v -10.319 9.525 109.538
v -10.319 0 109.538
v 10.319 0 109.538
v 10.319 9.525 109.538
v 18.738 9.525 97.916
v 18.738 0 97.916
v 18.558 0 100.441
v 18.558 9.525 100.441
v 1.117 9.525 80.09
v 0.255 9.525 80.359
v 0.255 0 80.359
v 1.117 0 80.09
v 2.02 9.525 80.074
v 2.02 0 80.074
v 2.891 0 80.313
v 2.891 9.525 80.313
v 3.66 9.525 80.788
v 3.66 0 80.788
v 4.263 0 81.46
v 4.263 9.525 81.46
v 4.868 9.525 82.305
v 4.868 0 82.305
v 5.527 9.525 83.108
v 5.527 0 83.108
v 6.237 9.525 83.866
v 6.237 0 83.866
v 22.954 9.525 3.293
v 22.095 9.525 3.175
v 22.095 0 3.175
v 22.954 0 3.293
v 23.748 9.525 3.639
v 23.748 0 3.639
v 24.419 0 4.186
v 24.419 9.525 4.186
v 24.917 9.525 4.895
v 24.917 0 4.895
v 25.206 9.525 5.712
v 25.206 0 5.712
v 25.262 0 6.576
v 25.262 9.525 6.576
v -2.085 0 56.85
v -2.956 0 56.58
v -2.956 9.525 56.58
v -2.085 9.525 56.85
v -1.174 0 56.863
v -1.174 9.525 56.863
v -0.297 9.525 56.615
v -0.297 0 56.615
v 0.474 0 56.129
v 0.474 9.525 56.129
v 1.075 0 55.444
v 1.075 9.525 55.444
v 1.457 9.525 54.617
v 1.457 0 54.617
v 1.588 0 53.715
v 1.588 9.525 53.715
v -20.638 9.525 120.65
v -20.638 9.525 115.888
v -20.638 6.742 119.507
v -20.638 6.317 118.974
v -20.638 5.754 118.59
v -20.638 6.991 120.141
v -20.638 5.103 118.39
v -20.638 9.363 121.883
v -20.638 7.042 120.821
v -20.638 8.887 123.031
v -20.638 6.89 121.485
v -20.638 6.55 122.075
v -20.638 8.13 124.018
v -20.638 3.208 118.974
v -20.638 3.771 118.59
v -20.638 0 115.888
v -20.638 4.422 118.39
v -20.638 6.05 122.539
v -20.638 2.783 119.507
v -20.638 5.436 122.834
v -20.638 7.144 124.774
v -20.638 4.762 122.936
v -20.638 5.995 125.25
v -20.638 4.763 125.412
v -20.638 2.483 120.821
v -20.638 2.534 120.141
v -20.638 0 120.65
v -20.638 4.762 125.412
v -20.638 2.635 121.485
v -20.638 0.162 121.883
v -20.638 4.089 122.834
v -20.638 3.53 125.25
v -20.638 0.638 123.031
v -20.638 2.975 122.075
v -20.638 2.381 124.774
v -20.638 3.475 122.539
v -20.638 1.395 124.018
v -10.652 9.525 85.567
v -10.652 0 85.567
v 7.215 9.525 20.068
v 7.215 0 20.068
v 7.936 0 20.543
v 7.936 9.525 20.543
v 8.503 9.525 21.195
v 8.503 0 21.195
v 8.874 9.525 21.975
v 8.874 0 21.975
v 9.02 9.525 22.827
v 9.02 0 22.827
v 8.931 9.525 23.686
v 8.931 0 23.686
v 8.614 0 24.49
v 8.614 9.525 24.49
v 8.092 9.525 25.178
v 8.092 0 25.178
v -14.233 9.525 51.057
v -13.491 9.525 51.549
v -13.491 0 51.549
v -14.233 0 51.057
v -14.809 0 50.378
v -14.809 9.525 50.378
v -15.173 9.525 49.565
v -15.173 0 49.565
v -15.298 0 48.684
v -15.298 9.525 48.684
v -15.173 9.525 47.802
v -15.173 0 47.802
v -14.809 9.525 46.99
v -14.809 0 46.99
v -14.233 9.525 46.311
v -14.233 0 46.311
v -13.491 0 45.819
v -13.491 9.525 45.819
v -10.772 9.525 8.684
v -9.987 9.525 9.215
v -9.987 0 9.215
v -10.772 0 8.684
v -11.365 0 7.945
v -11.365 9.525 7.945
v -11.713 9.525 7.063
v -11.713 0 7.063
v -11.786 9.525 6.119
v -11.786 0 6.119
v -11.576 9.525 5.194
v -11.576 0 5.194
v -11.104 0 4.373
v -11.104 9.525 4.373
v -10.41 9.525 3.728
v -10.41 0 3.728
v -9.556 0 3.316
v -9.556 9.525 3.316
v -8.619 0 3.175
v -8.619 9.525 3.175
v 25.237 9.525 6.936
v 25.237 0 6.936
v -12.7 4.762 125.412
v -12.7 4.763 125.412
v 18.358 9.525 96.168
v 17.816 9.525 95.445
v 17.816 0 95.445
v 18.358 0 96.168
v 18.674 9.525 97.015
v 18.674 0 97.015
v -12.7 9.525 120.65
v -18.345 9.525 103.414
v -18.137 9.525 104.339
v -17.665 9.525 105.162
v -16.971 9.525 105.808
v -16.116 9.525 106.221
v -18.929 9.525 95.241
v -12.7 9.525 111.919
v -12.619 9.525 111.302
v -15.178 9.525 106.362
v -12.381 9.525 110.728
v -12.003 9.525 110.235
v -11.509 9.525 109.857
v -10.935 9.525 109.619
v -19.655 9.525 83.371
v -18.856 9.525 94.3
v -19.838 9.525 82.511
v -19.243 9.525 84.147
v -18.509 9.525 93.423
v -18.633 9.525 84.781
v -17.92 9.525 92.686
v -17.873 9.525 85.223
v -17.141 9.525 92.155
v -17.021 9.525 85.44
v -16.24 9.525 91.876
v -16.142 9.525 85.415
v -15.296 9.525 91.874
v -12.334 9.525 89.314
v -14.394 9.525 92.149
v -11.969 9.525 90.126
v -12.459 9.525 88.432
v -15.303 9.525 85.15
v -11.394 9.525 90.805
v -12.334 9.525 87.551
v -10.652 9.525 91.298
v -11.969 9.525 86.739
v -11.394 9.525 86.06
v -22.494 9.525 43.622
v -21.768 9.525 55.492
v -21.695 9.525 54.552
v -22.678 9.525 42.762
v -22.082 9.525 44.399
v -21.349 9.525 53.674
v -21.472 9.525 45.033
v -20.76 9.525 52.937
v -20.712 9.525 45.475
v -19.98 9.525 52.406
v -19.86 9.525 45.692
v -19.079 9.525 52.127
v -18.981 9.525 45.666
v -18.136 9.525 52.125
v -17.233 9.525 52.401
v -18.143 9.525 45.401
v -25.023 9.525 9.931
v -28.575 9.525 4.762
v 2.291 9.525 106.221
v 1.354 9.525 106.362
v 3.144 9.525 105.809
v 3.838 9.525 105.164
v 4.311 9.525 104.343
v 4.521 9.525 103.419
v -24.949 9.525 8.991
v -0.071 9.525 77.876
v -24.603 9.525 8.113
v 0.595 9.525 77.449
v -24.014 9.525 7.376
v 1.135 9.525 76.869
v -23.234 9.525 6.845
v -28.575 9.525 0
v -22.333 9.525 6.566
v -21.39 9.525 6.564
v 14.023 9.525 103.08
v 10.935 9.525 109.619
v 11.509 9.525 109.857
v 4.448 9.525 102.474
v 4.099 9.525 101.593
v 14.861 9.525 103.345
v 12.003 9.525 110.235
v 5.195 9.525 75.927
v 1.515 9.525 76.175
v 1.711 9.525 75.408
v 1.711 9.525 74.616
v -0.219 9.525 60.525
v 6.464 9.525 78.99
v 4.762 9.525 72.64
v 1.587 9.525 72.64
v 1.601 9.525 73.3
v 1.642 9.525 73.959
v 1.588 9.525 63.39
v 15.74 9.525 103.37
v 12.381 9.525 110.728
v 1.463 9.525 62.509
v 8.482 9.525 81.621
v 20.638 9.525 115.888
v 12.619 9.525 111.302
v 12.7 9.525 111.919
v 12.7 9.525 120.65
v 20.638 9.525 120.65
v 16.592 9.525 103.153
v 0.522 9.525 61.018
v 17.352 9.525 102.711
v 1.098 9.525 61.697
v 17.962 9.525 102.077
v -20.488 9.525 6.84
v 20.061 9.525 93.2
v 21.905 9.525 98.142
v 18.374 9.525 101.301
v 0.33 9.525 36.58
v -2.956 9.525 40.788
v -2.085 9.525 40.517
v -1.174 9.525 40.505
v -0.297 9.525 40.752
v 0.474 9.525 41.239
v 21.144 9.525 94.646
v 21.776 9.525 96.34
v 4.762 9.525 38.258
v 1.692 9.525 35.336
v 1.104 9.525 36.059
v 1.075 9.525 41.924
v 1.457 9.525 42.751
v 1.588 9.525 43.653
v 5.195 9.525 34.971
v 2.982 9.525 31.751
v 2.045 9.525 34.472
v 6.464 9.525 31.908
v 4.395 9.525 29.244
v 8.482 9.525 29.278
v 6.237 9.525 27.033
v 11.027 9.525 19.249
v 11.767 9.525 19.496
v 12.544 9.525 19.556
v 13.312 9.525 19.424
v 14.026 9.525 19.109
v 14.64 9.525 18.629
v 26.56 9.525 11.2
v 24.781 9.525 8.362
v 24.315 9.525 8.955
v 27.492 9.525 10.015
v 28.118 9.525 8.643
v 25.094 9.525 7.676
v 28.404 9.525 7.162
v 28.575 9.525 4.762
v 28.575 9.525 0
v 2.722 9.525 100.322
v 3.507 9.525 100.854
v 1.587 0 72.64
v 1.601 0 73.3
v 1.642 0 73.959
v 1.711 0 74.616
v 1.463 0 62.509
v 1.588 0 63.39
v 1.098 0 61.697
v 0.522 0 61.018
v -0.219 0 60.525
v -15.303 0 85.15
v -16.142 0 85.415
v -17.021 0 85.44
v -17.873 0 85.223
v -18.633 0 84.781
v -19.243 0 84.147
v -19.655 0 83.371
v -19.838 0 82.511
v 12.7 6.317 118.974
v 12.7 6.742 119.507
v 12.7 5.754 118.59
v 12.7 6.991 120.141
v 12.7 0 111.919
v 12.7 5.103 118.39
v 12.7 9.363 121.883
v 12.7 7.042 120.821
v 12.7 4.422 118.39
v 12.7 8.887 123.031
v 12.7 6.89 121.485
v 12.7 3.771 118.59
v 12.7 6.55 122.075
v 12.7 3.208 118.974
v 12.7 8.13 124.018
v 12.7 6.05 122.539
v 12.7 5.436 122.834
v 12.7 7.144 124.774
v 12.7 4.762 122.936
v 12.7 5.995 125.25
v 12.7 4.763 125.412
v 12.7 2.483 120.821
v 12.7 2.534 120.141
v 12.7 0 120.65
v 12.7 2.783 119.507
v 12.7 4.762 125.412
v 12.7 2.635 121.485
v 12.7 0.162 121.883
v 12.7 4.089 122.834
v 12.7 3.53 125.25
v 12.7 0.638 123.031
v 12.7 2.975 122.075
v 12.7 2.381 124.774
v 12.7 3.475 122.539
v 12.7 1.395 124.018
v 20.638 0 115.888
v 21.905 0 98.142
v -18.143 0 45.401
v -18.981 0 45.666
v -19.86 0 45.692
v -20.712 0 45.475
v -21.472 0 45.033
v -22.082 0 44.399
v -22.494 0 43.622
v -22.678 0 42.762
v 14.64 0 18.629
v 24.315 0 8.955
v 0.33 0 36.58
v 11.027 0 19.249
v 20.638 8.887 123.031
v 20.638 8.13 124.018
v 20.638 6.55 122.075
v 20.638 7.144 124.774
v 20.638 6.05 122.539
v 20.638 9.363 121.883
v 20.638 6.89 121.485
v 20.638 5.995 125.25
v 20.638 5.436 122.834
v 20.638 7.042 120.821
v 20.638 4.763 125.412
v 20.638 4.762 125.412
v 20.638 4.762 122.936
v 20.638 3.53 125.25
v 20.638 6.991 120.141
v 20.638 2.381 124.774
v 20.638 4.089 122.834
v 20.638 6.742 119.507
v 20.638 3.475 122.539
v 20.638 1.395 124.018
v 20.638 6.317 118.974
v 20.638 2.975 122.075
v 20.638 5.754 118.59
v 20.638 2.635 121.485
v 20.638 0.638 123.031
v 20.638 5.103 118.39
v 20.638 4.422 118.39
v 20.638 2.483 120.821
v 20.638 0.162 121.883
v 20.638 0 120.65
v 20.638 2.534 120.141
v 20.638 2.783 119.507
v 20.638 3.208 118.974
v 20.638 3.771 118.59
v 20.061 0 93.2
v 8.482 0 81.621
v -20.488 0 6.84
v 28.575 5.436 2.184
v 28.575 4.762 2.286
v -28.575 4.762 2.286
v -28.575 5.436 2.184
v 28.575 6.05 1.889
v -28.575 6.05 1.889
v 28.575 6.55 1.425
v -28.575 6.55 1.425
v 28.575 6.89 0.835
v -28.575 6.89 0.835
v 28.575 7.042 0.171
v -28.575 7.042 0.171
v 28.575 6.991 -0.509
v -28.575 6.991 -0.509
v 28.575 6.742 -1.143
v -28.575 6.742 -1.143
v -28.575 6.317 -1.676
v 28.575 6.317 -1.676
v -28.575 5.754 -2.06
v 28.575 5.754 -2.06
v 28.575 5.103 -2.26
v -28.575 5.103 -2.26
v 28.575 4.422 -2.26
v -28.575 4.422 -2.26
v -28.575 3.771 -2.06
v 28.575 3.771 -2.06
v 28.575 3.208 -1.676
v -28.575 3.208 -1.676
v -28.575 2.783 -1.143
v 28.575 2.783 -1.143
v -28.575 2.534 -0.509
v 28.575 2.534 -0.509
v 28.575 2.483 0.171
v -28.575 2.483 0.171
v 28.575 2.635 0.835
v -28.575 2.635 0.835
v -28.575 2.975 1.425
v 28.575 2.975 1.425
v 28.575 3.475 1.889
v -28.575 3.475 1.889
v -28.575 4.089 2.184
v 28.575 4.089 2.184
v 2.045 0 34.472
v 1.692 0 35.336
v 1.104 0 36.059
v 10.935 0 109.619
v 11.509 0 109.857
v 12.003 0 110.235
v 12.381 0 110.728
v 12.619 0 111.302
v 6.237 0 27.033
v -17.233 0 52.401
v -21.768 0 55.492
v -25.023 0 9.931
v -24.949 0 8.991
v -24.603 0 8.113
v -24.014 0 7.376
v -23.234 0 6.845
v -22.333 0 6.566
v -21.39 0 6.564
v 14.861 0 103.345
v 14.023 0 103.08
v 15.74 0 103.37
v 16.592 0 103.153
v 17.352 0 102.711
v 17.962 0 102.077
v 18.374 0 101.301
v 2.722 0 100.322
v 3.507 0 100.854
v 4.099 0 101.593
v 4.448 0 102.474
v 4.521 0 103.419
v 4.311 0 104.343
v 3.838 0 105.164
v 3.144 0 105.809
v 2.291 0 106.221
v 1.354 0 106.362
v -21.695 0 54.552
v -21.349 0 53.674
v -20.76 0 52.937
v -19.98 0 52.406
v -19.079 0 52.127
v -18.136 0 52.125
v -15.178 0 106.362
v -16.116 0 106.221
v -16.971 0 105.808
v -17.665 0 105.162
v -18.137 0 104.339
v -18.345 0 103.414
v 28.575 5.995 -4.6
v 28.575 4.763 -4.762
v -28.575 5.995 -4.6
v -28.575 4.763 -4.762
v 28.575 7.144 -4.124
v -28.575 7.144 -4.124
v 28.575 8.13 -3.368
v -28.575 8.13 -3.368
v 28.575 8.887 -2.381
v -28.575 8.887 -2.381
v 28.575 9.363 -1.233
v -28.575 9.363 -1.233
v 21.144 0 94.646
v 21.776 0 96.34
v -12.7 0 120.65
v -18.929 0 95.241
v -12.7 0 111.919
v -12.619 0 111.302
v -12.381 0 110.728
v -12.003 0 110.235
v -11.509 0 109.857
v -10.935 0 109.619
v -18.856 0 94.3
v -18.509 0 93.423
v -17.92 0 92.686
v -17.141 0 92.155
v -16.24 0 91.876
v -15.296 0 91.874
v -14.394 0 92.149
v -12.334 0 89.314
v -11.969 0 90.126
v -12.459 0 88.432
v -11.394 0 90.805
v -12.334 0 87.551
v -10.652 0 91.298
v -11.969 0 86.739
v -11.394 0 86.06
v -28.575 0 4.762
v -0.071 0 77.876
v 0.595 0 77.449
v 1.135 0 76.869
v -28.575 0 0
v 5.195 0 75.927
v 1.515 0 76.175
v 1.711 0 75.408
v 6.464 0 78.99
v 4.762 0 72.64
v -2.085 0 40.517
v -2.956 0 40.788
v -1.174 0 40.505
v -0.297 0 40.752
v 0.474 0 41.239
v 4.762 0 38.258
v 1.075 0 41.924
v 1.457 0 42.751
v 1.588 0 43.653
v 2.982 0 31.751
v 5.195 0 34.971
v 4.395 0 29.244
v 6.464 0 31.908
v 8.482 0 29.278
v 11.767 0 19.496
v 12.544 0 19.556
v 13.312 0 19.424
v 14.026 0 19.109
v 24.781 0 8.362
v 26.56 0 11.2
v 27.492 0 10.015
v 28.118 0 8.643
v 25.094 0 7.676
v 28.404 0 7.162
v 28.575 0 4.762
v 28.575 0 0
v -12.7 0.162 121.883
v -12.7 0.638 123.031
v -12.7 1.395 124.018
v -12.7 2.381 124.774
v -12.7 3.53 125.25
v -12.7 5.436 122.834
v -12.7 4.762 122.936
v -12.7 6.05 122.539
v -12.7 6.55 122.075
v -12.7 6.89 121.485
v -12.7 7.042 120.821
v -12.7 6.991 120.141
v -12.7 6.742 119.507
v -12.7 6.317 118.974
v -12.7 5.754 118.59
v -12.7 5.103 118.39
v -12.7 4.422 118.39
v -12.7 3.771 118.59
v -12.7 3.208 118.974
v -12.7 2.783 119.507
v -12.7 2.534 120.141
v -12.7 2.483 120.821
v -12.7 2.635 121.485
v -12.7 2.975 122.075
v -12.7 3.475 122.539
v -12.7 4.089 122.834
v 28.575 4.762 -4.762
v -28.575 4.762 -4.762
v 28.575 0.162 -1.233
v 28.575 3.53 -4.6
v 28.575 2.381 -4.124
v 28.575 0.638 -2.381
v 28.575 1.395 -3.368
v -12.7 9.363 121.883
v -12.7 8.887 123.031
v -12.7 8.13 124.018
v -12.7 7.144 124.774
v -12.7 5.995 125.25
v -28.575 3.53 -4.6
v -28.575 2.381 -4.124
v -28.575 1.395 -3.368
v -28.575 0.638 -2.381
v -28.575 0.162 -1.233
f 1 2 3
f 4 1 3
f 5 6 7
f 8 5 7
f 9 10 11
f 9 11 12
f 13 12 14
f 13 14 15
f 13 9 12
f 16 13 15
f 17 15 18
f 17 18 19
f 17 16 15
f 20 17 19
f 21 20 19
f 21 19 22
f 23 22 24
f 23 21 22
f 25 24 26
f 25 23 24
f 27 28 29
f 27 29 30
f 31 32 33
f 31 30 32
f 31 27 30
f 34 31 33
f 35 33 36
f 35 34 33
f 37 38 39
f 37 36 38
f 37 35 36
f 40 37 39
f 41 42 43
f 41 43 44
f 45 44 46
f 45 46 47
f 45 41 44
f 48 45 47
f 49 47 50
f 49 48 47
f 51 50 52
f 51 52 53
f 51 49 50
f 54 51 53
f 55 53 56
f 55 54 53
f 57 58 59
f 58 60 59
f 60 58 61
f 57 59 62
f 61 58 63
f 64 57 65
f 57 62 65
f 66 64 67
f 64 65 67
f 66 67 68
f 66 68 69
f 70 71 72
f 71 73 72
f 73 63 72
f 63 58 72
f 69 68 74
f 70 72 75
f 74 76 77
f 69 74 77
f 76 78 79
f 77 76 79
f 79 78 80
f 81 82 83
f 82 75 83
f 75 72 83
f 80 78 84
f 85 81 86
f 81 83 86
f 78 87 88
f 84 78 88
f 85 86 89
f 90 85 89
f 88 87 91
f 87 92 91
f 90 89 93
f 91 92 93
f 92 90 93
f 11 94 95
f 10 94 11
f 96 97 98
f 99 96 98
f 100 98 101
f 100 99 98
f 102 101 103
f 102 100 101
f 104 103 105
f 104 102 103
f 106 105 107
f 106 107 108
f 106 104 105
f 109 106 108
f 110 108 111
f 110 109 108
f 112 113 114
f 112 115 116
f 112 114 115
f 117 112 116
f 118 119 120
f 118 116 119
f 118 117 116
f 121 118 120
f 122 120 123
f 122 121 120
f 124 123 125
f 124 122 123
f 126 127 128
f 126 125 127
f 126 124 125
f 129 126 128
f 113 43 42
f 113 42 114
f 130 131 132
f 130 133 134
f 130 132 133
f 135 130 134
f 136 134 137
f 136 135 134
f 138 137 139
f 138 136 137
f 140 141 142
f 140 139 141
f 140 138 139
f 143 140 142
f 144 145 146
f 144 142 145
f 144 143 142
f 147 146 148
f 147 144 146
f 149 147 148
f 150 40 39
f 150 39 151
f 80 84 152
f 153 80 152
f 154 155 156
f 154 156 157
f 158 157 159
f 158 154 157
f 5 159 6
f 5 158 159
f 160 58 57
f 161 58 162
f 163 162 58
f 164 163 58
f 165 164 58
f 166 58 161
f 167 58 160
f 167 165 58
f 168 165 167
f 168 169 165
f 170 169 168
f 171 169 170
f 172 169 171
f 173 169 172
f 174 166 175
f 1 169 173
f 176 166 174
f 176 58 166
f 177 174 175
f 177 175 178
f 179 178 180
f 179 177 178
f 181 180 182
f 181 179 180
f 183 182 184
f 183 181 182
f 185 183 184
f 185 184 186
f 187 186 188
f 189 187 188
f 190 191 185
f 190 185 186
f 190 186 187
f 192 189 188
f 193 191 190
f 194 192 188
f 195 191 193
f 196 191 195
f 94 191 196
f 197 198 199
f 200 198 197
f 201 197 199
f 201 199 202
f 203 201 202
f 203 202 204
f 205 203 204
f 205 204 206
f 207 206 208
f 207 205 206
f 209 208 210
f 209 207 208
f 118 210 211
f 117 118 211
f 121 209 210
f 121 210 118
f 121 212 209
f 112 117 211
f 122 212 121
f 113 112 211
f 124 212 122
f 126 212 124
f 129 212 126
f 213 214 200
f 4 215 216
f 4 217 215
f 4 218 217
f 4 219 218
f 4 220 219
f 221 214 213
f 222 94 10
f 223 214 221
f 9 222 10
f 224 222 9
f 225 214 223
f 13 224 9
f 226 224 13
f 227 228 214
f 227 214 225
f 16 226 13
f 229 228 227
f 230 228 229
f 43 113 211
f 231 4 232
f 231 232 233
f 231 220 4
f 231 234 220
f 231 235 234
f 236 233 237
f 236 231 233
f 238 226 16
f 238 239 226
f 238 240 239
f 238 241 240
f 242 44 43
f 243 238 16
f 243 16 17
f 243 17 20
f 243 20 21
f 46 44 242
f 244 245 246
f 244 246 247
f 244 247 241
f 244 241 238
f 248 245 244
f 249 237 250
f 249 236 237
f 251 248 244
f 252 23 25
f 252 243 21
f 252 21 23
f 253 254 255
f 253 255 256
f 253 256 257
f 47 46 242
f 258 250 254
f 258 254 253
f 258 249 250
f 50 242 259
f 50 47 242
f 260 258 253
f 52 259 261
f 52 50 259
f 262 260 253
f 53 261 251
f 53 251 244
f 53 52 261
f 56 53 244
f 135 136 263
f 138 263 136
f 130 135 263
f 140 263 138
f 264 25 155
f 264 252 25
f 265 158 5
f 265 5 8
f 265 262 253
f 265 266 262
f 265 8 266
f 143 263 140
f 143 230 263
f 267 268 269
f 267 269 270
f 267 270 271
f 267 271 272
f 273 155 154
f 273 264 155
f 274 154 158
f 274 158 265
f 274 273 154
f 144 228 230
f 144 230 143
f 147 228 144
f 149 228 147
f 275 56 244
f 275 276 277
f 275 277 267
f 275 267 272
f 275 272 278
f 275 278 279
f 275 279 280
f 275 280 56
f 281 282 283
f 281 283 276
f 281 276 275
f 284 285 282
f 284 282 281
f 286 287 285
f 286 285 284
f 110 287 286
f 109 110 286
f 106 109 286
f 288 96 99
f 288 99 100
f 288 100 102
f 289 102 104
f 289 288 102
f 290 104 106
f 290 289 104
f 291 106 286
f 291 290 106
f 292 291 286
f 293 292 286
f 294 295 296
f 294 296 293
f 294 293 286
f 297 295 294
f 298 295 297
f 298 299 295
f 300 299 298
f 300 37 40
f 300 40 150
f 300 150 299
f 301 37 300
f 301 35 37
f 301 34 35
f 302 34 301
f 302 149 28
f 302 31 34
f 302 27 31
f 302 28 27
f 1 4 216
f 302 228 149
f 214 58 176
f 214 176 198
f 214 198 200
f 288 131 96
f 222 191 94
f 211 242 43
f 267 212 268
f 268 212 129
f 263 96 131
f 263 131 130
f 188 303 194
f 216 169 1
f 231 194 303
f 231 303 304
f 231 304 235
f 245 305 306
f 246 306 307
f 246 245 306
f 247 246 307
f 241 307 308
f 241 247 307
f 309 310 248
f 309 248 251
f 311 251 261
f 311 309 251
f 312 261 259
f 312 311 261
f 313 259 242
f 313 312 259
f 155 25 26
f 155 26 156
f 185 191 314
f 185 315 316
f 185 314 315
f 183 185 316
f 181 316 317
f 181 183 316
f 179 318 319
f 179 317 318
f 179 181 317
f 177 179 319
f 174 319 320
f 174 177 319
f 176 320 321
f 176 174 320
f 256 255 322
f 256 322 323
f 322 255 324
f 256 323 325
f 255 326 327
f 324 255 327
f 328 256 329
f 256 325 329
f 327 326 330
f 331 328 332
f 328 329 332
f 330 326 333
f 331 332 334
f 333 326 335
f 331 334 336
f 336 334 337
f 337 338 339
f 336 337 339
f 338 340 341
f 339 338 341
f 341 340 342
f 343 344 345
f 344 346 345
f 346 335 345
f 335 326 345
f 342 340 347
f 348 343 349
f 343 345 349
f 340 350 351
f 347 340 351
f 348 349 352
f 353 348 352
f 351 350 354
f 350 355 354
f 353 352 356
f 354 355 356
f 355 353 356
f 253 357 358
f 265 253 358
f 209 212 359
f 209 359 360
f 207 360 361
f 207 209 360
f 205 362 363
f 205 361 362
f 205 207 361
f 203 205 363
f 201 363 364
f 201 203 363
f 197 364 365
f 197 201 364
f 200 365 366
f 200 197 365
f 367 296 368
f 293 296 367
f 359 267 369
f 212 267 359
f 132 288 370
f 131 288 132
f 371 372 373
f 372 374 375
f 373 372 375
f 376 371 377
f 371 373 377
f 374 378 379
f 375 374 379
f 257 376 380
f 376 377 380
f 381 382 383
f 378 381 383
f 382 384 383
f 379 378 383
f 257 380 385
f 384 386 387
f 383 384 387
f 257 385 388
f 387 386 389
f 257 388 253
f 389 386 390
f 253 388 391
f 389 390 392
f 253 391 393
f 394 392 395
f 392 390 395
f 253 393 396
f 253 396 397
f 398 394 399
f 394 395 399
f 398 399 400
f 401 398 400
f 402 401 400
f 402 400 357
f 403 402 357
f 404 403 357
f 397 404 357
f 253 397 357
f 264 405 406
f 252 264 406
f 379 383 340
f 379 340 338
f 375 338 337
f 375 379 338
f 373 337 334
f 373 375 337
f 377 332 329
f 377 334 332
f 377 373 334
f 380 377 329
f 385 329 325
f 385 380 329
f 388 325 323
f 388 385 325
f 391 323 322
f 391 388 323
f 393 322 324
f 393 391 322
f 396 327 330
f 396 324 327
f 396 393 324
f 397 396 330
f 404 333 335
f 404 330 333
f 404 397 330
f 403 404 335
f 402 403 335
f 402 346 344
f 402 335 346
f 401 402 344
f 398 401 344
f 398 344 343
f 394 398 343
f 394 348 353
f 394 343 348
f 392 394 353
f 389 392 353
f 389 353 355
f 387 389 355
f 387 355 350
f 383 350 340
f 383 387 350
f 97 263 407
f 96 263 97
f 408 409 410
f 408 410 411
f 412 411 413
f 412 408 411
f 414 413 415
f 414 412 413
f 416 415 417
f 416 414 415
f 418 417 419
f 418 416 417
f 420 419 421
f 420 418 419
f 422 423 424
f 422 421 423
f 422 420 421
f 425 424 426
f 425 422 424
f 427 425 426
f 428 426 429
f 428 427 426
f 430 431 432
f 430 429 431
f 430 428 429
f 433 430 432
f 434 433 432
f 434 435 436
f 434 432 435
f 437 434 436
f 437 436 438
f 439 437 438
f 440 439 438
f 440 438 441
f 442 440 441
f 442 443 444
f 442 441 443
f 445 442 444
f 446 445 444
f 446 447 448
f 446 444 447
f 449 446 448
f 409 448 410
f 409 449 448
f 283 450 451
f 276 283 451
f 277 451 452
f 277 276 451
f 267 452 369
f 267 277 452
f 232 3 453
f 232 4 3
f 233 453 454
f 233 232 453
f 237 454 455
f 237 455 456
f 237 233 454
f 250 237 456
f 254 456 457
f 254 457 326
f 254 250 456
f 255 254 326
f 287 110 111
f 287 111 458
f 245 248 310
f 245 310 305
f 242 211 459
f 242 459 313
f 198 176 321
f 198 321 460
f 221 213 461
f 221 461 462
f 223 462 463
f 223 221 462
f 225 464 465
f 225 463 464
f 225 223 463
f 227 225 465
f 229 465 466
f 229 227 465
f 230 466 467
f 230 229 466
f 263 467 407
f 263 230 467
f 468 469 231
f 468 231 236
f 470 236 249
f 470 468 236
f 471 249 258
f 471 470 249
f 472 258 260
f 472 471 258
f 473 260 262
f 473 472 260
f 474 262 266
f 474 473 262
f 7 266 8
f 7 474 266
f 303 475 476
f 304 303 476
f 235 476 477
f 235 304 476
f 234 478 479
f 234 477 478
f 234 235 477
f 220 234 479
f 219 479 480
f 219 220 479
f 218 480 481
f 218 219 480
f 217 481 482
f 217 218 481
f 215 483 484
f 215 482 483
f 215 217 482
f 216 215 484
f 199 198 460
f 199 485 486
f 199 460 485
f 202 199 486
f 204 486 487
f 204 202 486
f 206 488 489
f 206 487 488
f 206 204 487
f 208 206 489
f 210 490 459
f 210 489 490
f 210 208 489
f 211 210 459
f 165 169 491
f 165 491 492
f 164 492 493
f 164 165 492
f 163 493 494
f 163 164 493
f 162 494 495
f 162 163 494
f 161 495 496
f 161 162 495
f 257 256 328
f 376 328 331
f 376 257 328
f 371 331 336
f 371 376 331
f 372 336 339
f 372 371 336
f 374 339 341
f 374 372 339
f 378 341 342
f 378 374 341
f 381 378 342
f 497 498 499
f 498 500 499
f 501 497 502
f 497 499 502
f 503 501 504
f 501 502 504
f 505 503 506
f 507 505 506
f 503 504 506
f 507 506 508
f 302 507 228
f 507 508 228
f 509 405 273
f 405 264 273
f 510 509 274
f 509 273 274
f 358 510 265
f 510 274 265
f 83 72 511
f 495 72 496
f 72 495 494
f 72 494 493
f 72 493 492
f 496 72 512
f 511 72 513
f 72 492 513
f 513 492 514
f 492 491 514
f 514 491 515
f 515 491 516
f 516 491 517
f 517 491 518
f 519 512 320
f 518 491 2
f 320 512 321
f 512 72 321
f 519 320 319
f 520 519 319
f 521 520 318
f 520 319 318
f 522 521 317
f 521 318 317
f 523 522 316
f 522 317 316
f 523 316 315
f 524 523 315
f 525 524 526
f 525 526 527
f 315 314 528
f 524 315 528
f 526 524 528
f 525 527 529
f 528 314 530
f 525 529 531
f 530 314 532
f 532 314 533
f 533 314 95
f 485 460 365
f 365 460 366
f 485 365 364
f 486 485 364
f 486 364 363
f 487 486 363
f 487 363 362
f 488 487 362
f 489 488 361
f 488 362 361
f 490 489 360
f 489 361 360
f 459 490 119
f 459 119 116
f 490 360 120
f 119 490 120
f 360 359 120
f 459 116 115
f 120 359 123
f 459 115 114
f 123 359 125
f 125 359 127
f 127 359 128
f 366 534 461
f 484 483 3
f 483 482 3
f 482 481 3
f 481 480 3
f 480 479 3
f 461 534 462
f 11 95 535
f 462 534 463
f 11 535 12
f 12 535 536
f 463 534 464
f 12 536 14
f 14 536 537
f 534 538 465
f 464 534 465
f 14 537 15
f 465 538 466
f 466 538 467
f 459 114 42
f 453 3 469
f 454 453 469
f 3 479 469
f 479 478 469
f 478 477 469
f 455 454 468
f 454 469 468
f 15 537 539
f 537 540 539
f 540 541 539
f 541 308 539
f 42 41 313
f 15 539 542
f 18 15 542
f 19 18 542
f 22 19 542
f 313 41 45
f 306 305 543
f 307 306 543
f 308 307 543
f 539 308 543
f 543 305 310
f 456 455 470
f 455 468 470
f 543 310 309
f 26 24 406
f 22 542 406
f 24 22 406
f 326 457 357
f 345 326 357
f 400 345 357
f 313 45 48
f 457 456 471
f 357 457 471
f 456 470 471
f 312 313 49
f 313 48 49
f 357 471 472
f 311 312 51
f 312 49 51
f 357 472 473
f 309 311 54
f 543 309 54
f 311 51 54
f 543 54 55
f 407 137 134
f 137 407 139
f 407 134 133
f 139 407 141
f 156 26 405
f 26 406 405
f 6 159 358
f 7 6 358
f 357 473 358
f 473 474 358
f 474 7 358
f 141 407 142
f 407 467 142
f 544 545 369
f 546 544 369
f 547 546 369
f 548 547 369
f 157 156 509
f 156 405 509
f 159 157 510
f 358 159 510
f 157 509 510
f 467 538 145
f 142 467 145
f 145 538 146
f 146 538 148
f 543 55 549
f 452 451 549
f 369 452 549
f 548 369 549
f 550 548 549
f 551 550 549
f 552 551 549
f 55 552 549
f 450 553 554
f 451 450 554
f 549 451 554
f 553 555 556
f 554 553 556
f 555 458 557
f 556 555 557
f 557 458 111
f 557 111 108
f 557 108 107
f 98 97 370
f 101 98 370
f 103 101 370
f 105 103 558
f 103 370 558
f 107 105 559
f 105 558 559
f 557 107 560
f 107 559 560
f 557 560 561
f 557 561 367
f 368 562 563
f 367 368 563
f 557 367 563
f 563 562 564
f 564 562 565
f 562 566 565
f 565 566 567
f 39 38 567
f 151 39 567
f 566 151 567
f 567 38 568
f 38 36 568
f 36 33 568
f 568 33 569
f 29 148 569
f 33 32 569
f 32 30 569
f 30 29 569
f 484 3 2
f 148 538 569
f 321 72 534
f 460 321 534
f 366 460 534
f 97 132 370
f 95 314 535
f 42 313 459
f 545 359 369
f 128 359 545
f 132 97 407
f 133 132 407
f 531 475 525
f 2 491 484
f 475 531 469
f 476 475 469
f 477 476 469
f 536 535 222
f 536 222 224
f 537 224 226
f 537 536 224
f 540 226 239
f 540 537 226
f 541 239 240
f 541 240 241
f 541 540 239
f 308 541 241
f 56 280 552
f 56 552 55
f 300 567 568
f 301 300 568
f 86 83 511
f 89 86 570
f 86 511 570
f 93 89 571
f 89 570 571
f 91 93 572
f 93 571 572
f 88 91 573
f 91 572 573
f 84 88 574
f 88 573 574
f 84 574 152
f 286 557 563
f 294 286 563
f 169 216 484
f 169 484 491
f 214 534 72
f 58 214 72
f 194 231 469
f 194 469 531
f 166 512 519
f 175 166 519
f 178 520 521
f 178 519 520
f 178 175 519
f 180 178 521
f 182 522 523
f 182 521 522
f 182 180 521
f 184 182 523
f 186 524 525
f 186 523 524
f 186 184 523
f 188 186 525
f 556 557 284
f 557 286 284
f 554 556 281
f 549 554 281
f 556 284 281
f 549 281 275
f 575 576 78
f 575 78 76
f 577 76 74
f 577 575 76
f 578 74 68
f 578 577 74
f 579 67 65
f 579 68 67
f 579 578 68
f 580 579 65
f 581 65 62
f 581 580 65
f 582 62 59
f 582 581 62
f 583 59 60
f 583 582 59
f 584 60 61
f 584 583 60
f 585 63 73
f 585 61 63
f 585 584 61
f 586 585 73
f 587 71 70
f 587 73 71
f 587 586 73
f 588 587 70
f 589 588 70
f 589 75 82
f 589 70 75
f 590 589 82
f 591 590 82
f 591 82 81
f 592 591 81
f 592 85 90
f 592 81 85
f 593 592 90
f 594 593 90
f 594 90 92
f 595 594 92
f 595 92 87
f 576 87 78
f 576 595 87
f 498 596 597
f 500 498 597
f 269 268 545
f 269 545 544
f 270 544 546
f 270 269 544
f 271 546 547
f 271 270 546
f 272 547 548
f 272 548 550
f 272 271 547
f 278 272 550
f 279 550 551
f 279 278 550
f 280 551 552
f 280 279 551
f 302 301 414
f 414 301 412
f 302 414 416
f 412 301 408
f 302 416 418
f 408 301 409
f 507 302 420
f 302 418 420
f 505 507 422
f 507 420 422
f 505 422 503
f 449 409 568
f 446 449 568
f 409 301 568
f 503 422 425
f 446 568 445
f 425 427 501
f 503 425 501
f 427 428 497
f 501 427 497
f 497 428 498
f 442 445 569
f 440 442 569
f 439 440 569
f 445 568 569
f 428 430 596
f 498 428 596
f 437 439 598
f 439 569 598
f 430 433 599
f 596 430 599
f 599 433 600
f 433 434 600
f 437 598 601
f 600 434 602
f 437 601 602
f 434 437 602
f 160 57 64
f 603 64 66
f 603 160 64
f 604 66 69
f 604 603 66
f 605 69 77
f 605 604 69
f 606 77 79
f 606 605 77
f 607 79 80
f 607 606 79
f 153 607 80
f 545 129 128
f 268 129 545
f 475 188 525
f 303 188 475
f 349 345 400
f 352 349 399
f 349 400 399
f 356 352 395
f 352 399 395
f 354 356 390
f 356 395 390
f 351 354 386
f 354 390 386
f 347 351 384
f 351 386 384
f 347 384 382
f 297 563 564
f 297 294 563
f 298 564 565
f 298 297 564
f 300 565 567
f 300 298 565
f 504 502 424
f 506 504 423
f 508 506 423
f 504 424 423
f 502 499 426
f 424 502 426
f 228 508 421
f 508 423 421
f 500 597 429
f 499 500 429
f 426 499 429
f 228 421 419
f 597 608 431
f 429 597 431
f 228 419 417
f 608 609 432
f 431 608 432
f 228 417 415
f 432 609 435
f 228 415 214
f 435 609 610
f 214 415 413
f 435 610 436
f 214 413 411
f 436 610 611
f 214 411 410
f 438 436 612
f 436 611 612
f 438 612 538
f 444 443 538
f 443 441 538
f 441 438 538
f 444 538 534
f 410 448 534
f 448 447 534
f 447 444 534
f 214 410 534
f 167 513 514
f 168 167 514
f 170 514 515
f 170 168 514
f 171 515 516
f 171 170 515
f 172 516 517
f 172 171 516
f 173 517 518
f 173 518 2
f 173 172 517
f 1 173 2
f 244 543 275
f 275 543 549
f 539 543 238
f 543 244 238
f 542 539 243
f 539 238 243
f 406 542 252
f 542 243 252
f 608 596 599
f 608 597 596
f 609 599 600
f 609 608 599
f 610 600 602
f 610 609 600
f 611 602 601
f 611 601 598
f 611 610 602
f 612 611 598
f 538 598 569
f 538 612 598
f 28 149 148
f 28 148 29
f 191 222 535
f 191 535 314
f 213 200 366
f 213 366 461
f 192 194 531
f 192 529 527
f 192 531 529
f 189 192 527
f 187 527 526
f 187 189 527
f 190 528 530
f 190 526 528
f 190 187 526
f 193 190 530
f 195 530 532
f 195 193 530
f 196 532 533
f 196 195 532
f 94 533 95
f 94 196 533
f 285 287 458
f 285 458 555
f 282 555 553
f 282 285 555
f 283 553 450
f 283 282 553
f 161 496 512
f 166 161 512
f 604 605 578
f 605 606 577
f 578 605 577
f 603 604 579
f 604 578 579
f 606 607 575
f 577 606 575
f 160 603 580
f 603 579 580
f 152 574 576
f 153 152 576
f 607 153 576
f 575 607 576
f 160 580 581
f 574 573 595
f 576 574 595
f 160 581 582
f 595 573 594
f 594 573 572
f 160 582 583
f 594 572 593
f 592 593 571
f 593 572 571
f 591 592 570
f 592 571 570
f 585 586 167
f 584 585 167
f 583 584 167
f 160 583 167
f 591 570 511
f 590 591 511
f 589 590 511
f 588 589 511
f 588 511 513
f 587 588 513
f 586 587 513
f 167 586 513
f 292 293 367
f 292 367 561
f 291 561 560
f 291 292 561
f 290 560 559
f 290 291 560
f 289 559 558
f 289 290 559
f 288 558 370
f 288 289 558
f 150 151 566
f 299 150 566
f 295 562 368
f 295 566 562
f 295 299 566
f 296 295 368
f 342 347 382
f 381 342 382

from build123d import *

# Parameters (mm, degrees)
BOSS_EXTRUDE1_DEPTH     = 9.525
CUT_EXTRUDE2_DEPTH      = 139.148989433
CUT_EXTRUDE2_DEPTH_BACK = 139.148989433
SKETCH6_R               = 2.286
FILLET5_R               = 4.7625
FILLET6_R               = 12.7
FILLET7_R               = 6.35
CUT_EXTRUDE3_DEPTH      = 129.978879691
CUT_EXTRUDE3_DEPTH_BACK = 129.978879691
FILLET8_R               = 3.175
FILLET9_R               = 2.38125


# Some blends are built 0.0001 mm under size
with BuildPart() as part:
    # Sketch1 → Boss-Extrude1 (new body)
    with BuildSketch(Plane(origin=(0, 0, 0), x_dir=(1, 0, 0), z_dir=(0, 1, 0))):
        Polygon((-28.575, 4.7625), (-28.575, -4.7625), (-20.6375, -115.8875), (-20.6375, -125.4125), (-12.7, -125.4125), (-12.7, -109.5375), (12.7, -109.5375), (12.7, -125.4125), (20.6375, -125.4125), (20.6375, -115.8875), (22.111607143, -95.25), (4.7625, -77.900892857), (4.7625, -32.997321429), (28.234821429, -9.525), (28.575, -4.7625), (28.575, 4.7625), align=None)
    extrude(amount=BOSS_EXTRUDE1_DEPTH)

    # Sketch6 → Cut-Extrude2 (cut, two sides: drawn at the far end of the back side and taken through both)
    with BuildSketch(Plane.ZY.offset(28.575).offset(-CUT_EXTRUDE2_DEPTH_BACK)):
        with Locations((0, 4.7625)):
            Circle(SKETCH6_R)
        with Locations((120.65, 4.7625)):
            Circle(SKETCH6_R)
    extrude(amount=CUT_EXTRUDE2_DEPTH + CUT_EXTRUDE2_DEPTH_BACK, mode=Mode.SUBTRACT)

    # Fillet5
    fillet5_edges = [part.edges().sort_by_distance(p)[0] for p in [
        (0, 0, -4.7625),
        (0, 9.525, -4.7625),
        (16.66875, 0, 125.4125),
        (16.66875, 9.525, 125.4125),
        (-16.66875, 0, 125.4125),
        (-16.66875, 9.525, 125.4125),
    ]]
    fillet(fillet5_edges, radius=FILLET5_R - 0.0001)  # a hair under: the kernel refuses the full size

    # Fillet6
    fillet6_edges = [part.edges().sort_by_distance(p)[0] for p in [
        (4.7625, 4.7625, 32.997321429),
        (4.7625, 4.7625, 77.900892857),
    ]]
    fillet(fillet6_edges, radius=FILLET6_R)

    # Fillet7
    fillet7_edges = [part.edges().sort_by_distance(p)[0] for p in [
        (28.234821429, 4.7625, 9.525),
        (22.111607143, 4.7625, 95.25),
    ]]
    fillet(fillet7_edges, radius=FILLET7_R)

    # Sketch7 → Cut-Extrude3 (cut, two sides: drawn at the far end of the back side and taken through both)
    with BuildSketch(Plane.XZ.offset(-CUT_EXTRUDE3_DEPTH_BACK)):
        with BuildLine():
            ThreePointArc((-15.178464487, 106.3625), (-17.342073764, 105.511165186), (-18.345395859, 103.413709384))
            Line((-18.345395859, 103.413709384), (-18.929176024, 95.240787072))
            ThreePointArc((-18.929176024, 95.240787072), (-17.550554149, 92.391111633), (-14.394156229, 92.149449581))
            Line((-14.394156229, 92.149449581), (2.722039645, 100.322371894))
            ThreePointArc((2.722039645, 100.322371894), (4.450514376, 103.888871251), (1.353951221, 106.3625))
            Line((1.353951221, 106.3625), (-15.178464487, 106.3625))
        make_face()
        with BuildLine():
            Line((-10.652026542, 85.567257834), (2.949065003, 79.072785266))
            ThreePointArc((2.949065003, 79.072785266), (4.371896924, 81.621011779), (6.237179849, 83.865700766))
            Line((6.237179849, 83.865700766), (17.816220953, 95.444741871))
            ThreePointArc((17.816220953, 95.444741871), (18.545921053, 96.580119743), (18.738088295, 97.916015285))
            Line((18.738088295, 97.916015285), (18.355750526, 103.268744039))
            ThreePointArc((18.355750526, 103.268744039), (16.767104452, 103.883635913), (15.089301508, 103.588906124))
            Line((15.089301508, 103.588906124), (-10.652026542, 91.297514046))
            ThreePointArc((-10.652026542, 91.297514046), (-12.458938118, 88.43238594), (-10.652026542, 85.567257834))
        make_face()
        with BuildLine():
            ThreePointArc((-15.303455952, 85.149509664), (-18.268395024, 85.028592375), (-19.838475748, 82.510590942))
            Line((-19.838475748, 82.510590942), (-21.768351953, 55.492324069))
            ThreePointArc((-21.768351953, 55.492324069), (-20.389730078, 52.642648631), (-17.233332157, 52.400986579))
            Line((-17.233332157, 52.400986579), (1.5875, 61.38786662))
            Line((1.5875, 61.38786662), (1.5875, 72.640380615))
            ThreePointArc((1.5875, 72.640380615), (1.727944926, 74.747369375), (2.146794694, 76.817077393))
            Line((2.146794694, 76.817077393), (-15.303455952, 85.149509664))
        make_face()
        with BuildLine():
            Line((1.5875, 38.618768332), (1.5875, 58.749077544))
            Line((1.5875, 58.749077544), (-13.49120247, 51.549051044))
            ThreePointArc((-13.49120247, 51.549051044), (-15.298114047, 48.683922938), (-13.49120247, 45.818794832))
            Line((-13.49120247, 45.818794832), (1.5875, 38.618768332))
        make_face()
        with BuildLine():
            ThreePointArc((-18.142631881, 45.401046662), (-21.107570953, 45.280129373), (-22.677651676, 42.76212794))
            Line((-22.677651676, 42.76212794), (-25.022707709, 9.93134348))
            ThreePointArc((-25.022707709, 9.93134348), (-23.644085834, 7.081668041), (-20.487687914, 6.84000599))
            Line((-20.487687914, 6.84000599), (11.26695768, 22.002735688))
            Line((11.26695768, 22.002735688), (6.237179849, 27.032513519))
            ThreePointArc((6.237179849, 27.032513519), (3.290050222, 31.105401057), (1.764238406, 35.895587299))
            Line((1.764238406, 35.895587299), (-18.142631881, 45.401046662))
        make_face()
        with BuildLine():
            ThreePointArc((-9.987271687, 9.215128106), (-11.715746418, 5.648628749), (-8.619183264, 3.175))
            Line((-8.619183264, 3.175), (22.095428773, 3.175))
            ThreePointArc((22.095428773, 3.175), (24.419093959, 4.186390723), (25.262360145, 6.576209384))
            Line((25.262360145, 6.576209384), (25.236657334, 6.936048729))
            ThreePointArc((25.236657334, 6.936048729), (24.957868459, 8.028648627), (24.314789993, 8.954903375))
            Line((24.314789993, 8.954903375), (13.052944458, 20.21674891))
            Line((13.052944458, 20.21674891), (-9.987271687, 9.215128106))
        make_face()
    extrude(amount=CUT_EXTRUDE3_DEPTH + CUT_EXTRUDE3_DEPTH_BACK, mode=Mode.SUBTRACT)

    # Fillet8
    # the kernel refuses this fillet: 3.175 mm, written as the material it adds along each edge
    with BuildSketch(Plane(origin=(2.146794694, 0, 76.817077393), x_dir=(-0.19425863373245403, 0, -0.9809503469699169), z_dir=(0, 1, 0))) as fillet8_piece_1:
        with BuildLine():
            CenterArc((2.468233166, 3.167061169), FILLET8_R, 194.322890181, 71.624501931)
            Line((-0.608078232, 2.381610227), (0, 0))
            ThreePointArc((0, 0), (1.121924166, 0.039694156), (2.243848333, 0))
        make_face()
    extrude(amount=9.525)
    with BuildSketch(Plane(origin=(1.5875, 0, 61.38786662), x_dir=(0, 0, 1), z_dir=(0, 1, 0))) as fillet8_piece_2:
        with BuildLine():
            CenterArc((FILLET8_R * 0.630656469631, -FILLET8_R), FILLET8_R, 90, 64.475691518)
            Line((-FILLET8_R * 0.271746083545, -FILLET8_R * 0.569106008372), (0, 0))
            Line((0, 0), (FILLET8_R * 0.630656469631, 0))
        make_face()
    extrude(amount=9.525)
    with BuildSketch(Plane(origin=(2.949065003, 9.525, 79.072785266), x_dir=(0.482167275870273, 0, 0.8760791734083397), z_dir=(0, -1, 0))) as fillet8_piece_3:
        with BuildLine():
            CenterArc((2.997736865, 3.163282633), FILLET8_R, 183.302737657, 81.773303175)
            Line((-0.171989666, 2.980365394), (0, 0))
            ThreePointArc((0, 0), (1.362607666, 0.058586837), (2.725215332, 0))
        make_face()
    extrude(amount=9.525)
    with BuildSketch(Plane(origin=(18.355750526, 0, 103.268744039), x_dir=(-0.9990488574203268, 0, -0.04360482183359276), z_dir=(0, 1, 0))) as fillet8_piece_4:
        with BuildLine():
            CenterArc((3.095288472, -2.922058213), FILLET8_R, 66.97485618, 111.438691702)
            Line((-0.078494517, -2.834157465), (-0.395872815, -2.82536739))
            Line((-0.395872815, -2.82536739), (-0.317378299, 0.008790075))
            Line((-0.317378299, 0.008790075), (-0.200752777, 0.245976772))
            ThreePointArc((-0.200752777, 0.245976772), (3.373566927, 0.754496314), (4.461327625, 0.292205821))
            Line((4.461327625, 0.292205821), (4.337142248, 0))
        make_face()
    extrude(amount=9.525)
    with BuildSketch(Plane(origin=(1.764238406, 9.525, 35.895587299), x_dir=(-0.9024025531760991, 0, 0.4308939916281702), z_dir=(0, -1, 0))) as fillet8_piece_5:
        with BuildLine():
            CenterArc((1.589224556, 3.175), FILLET8_R, 219.319739753, 50.680260247)
            ThreePointArc((-0.867025133, 1.163169374), (-0.420218411, 0.591494135), (0, 0))
            Line((0, 0), (1.589224556, 0))
        make_face()
    extrude(amount=9.525)
    with BuildSketch(Plane(origin=(11.26695768, 9.525, 22.002735688), x_dir=(-0.7071067811865471, 0, 0.7071067811865479), z_dir=(0, -1, 0))) as fillet8_piece_6:
        with BuildLine():
            CenterArc((FILLET8_R * 1.4143306163, FILLET8_R), FILLET8_R, 160.524308482, 109.475691518)
            Line((FILLET8_R * 0.471547588134, FILLET8_R * 1.33340690126), (0, 0))
            Line((0, 0), (FILLET8_R * 1.4143306163, 0))
        make_face()
    extrude(amount=9.525)
    with BuildSketch(Plane(origin=(1.5875, 0, 58.749077544), x_dir=(-0.9024025531760999, 0, -0.4308939916281688), z_dir=(0, 1, 0))) as fillet8_piece_7:
        with BuildLine():
            CenterArc((FILLET8_R * 1.58564931647, -FILLET8_R), FILLET8_R, 90, 115.524308482)
            Line((FILLET8_R * 0.683246763298, -FILLET8_R * 1.43089399163), (0, 0))
            Line((0, 0), (FILLET8_R * 1.58564931647, 0))
        make_face()
    extrude(amount=9.525)
    with BuildSketch(Plane(origin=(1.5875, 9.525, 38.618768332), x_dir=(0, 0, 1), z_dir=(0, -1, 0))) as fillet8_piece_8:
        with BuildLine():
            CenterArc((FILLET8_R * 1.58564931647, FILLET8_R), FILLET8_R, 154.475691518, 115.524308482)
            Line((FILLET8_R * 0.683246763298, FILLET8_R * 1.43089399163), (0, 0))
            Line((0, 0), (FILLET8_R * 1.58564931647, 0))
        make_face()
    extrude(amount=9.525)
    with BuildSketch(Plane(origin=(13.052944458, 9.525, 20.21674891), x_dir=(-0.9024025531761012, 0, -0.4308939916281661), z_dir=(0, -1, 0))) as fillet8_piece_9:
        with BuildLine():
            CenterArc((FILLET8_R * 0.707048259068, FILLET8_R), FILLET8_R, 199.475691518, 70.524308482)
            Line((-FILLET8_R * 0.235734769096, FILLET8_R * 0.666593098742), (0, 0))
            Line((0, 0), (FILLET8_R * 0.707048259068, 0))
        make_face()
    extrude(amount=9.525)

    # Fillet9
    fillet9_edges = [part.edges().sort_by_distance(p)[0] for p in [
        (12.7, 4.7625, 109.5375),
        (-12.7, 4.7625, 109.5375),
    ]]
    fillet(fillet9_edges, radius=FILLET9_R)


solid = part.part
